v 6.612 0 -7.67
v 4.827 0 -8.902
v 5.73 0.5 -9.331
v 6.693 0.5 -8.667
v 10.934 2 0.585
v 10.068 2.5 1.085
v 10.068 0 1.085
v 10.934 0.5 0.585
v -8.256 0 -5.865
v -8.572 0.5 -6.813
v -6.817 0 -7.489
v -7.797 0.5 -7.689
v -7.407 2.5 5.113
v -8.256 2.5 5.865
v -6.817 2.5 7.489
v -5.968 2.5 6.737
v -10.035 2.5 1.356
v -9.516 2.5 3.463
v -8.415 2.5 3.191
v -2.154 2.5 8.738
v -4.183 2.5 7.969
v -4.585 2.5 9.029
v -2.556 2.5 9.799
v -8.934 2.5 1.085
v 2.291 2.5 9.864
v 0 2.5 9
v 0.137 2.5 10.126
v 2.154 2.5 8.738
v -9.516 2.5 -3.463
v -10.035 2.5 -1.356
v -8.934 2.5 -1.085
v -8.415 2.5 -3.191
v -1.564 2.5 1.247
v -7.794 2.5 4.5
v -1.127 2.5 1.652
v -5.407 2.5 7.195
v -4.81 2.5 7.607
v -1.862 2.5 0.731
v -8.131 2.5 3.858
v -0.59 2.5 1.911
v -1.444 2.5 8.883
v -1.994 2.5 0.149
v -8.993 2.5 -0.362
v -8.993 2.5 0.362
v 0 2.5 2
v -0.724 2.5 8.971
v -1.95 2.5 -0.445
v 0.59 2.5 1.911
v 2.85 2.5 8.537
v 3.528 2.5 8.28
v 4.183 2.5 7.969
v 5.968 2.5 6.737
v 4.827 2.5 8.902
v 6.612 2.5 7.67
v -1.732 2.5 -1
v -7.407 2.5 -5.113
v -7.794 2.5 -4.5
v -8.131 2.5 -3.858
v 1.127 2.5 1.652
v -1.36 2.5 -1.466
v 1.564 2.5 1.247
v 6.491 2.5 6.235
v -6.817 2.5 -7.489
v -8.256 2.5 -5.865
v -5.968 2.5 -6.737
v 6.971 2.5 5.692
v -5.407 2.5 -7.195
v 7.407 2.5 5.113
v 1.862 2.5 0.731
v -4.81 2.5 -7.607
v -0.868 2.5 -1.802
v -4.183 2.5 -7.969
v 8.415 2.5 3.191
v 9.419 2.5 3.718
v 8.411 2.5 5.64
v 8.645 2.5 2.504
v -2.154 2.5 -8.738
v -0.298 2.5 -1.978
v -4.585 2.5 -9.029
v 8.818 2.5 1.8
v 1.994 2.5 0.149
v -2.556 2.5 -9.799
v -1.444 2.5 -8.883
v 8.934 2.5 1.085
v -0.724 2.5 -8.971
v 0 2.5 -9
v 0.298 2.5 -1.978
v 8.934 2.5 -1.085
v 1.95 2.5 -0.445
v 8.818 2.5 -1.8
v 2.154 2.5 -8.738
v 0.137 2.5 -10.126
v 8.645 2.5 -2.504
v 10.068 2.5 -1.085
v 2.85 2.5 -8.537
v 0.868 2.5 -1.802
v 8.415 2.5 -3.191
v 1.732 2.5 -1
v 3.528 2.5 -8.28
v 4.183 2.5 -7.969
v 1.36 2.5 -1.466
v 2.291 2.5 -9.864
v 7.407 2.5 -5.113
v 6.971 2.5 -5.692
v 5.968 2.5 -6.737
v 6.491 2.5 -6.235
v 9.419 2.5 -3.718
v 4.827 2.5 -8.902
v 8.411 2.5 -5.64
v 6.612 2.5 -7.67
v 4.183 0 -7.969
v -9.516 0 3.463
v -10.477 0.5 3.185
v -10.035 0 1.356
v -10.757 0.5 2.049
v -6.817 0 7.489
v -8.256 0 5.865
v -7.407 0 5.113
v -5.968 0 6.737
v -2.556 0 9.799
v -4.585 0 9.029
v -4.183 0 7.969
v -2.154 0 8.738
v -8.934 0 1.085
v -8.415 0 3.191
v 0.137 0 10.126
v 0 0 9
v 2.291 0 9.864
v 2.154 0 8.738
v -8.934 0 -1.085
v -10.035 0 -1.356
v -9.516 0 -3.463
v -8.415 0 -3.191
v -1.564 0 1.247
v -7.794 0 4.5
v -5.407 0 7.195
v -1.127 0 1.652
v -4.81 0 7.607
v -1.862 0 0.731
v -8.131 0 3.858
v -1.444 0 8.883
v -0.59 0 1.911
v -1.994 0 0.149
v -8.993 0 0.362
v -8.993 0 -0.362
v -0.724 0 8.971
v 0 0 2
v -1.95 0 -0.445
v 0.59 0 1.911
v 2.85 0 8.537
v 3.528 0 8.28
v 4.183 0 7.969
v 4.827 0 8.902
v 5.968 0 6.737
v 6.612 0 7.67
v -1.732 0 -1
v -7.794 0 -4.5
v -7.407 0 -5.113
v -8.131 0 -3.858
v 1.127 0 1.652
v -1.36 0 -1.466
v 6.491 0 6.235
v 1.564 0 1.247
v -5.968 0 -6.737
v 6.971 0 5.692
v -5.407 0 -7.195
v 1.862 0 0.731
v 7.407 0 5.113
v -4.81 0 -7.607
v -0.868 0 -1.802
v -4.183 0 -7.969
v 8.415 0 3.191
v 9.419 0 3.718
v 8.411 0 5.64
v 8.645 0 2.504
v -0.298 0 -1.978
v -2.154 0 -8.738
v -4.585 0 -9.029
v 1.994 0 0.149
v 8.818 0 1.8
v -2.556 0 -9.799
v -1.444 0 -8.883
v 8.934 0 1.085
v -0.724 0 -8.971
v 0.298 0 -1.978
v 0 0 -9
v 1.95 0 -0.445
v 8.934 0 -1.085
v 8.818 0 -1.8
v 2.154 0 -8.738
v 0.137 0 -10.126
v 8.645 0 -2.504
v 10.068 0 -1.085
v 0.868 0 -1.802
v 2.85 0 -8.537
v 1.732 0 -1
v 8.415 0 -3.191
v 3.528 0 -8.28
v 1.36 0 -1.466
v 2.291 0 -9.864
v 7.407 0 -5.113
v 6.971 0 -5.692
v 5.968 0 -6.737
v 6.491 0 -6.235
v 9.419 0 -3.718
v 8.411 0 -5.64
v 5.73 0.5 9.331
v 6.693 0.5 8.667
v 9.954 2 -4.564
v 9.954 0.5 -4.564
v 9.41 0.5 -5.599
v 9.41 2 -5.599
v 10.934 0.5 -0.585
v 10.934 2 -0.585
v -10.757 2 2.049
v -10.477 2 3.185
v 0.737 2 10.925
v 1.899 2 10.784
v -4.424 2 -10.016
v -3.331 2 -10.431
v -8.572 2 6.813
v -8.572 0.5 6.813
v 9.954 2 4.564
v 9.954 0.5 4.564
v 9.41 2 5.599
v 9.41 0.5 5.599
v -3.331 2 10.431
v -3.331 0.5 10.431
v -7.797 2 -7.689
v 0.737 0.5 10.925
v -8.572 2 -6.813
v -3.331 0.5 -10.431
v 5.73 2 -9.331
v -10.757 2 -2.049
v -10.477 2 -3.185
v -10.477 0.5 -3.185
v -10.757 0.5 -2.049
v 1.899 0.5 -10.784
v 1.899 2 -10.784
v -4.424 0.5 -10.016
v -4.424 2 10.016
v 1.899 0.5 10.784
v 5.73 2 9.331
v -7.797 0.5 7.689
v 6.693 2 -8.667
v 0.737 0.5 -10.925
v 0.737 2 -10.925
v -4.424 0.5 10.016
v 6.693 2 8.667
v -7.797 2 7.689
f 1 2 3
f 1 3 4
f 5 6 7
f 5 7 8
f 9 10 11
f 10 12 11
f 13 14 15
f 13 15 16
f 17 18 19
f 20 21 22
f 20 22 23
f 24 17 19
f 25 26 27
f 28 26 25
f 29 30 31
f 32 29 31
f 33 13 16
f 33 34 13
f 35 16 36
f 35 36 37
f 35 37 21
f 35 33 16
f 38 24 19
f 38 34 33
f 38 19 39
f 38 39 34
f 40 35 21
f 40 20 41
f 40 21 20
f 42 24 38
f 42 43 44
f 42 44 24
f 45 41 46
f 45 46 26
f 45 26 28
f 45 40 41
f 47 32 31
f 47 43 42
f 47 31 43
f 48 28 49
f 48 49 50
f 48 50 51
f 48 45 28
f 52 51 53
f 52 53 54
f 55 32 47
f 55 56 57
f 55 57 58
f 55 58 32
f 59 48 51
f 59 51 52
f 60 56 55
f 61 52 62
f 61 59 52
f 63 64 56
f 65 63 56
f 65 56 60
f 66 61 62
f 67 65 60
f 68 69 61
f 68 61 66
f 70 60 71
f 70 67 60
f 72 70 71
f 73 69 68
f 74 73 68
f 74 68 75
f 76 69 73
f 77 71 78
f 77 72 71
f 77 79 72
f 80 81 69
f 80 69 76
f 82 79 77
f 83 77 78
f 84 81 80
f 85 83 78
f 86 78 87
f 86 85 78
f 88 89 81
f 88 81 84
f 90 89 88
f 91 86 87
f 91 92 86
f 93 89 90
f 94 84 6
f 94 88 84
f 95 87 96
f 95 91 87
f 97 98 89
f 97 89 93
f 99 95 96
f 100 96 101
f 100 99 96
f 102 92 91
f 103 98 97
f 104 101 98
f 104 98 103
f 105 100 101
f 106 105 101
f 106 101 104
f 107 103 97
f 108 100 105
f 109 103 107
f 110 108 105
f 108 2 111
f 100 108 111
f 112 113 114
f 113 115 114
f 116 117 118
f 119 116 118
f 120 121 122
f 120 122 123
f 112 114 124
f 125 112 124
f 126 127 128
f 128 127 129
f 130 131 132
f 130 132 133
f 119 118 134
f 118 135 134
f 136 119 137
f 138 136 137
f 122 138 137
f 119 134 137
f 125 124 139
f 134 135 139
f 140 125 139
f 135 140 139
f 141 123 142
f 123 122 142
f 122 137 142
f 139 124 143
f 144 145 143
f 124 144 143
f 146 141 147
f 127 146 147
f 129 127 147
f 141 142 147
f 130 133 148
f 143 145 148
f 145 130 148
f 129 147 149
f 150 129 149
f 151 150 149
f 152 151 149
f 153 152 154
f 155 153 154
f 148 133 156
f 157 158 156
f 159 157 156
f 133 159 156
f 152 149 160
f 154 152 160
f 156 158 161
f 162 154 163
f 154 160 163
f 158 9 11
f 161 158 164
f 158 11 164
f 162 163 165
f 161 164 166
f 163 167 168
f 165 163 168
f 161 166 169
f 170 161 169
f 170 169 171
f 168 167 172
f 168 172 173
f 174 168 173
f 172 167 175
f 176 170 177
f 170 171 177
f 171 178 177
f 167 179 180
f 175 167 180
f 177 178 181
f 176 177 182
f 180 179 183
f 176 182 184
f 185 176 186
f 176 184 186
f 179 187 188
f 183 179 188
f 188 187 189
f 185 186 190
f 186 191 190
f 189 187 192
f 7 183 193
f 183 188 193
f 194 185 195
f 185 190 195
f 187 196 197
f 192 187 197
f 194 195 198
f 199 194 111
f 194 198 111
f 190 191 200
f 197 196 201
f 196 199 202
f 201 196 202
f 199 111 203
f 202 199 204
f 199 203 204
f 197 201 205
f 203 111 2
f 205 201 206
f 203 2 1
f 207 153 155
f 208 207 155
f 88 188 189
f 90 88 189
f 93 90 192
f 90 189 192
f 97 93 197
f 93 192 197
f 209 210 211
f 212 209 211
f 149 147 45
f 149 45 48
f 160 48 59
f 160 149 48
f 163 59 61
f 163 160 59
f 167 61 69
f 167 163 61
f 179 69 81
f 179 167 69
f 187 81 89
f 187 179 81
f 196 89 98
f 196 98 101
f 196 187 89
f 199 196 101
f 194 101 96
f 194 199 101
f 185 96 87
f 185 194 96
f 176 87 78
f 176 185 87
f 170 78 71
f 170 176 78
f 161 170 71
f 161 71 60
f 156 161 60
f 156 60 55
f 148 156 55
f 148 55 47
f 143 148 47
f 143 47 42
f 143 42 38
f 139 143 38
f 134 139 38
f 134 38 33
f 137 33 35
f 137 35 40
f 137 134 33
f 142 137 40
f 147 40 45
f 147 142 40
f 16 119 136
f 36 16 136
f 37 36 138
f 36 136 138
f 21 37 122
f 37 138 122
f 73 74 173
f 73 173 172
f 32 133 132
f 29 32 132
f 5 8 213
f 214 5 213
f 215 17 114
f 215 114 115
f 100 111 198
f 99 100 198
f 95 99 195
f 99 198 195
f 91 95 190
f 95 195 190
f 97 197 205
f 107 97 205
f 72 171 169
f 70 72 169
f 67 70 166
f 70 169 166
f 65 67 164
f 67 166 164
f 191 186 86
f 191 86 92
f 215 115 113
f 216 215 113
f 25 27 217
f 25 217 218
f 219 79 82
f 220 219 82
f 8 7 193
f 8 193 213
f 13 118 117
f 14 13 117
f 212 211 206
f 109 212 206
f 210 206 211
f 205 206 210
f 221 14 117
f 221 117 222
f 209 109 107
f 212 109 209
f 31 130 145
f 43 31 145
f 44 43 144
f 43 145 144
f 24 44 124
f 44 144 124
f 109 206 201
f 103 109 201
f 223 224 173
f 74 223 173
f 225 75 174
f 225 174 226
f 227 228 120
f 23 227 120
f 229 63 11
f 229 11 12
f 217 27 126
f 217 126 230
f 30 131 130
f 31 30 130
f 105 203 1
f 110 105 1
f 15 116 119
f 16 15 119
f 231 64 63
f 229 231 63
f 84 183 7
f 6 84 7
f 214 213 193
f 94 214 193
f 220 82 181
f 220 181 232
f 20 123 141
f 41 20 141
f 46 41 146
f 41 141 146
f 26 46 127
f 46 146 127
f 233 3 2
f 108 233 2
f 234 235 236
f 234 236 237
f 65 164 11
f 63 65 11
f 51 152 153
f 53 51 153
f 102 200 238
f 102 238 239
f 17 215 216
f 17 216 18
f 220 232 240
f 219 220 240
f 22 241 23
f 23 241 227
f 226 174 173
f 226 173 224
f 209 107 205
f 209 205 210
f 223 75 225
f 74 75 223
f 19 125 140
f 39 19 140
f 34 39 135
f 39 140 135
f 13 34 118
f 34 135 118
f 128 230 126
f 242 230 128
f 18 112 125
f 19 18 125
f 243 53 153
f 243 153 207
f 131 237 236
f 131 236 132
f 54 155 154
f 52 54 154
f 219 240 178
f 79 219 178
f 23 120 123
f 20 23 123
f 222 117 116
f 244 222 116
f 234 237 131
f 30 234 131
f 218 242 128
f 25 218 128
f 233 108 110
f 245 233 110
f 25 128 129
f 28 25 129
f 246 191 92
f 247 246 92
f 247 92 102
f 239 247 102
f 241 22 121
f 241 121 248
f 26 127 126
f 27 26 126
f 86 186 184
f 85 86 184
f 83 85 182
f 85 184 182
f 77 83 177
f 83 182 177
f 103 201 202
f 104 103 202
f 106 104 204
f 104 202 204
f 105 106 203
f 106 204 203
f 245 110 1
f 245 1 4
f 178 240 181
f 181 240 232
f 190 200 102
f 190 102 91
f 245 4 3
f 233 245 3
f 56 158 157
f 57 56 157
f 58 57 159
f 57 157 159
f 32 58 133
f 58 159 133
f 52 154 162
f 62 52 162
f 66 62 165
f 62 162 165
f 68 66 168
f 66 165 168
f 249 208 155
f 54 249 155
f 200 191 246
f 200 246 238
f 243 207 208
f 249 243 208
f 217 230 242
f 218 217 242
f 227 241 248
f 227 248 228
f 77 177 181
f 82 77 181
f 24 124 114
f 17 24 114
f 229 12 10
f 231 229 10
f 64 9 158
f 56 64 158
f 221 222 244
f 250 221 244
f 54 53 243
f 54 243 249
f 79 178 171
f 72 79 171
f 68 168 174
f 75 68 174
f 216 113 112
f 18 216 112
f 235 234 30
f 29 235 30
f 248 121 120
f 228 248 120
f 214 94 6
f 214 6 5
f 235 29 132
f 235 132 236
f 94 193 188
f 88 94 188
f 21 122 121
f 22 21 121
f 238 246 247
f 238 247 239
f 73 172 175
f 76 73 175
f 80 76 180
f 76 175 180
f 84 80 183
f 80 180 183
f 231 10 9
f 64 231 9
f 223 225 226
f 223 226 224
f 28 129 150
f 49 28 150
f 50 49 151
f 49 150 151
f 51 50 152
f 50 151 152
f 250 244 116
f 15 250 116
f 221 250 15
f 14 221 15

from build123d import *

# Parameters (mm, degrees)
SKETCH1_R                = 9
SKETCH1_R_2              = 2
BOSS_EXTRUDE1_DEPTH      = 2.5
BOSS_EXTRUDE2_START      = -2.5
BOSS_EXTRUDE2_DEPTH      = 2.5
CHAMFER1_SIZE            = 0.5
CHAMFER1_SIZE2           = 0.866025404
CIRPATTERN1_DEPTH        = 2.5
CIRPATTERN1_START        = -6
CIRPATTERN1_2_OUTLINE_W  = 5
CIRPATTERN1_2_OUTLINE_H  = 6
CIRPATTERN1_2_DEPTH      = 0.965822768
CIRPATTERN1_START_2      = -7.632253443
CIRPATTERN1_3_OUTLINE_W  = 5
CIRPATTERN1_3_OUTLINE_H  = 6
CIRPATTERN1_3_DEPTH      = 0.433012702
CIRPATTERN1_4_OUTLINE_W  = 5
CIRPATTERN1_4_OUTLINE_H  = 5
CIRPATTERN1_4_DEPTH      = 0.965822768
CIRPATTERN1_START_3      = -9
CIRPATTERN1_5_OUTLINE_W  = 5
CIRPATTERN1_5_OUTLINE_H  = 6
CIRPATTERN1_5_DEPTH      = 1.800759259
CIRPATTERN1_START_4      = -5.467189934
CIRPATTERN1_6_OUTLINE_W  = 5
CIRPATTERN1_6_OUTLINE_H  = 5
CIRPATTERN1_6_DEPTH      = 0.433012702
CIRPATTERN1_7_OUTLINE_W  = 6
CIRPATTERN1_7_OUTLINE_H  = 5
CIRPATTERN1_7_DEPTH      = 1.800759259
CIRPATTERN1_8_OUTLINE_W  = 5
CIRPATTERN1_8_OUTLINE_H  = 5
CIRPATTERN1_8_DEPTH      = 0.965822768
CIRPATTERN1_9_OUTLINE_W  = 6
CIRPATTERN1_9_OUTLINE_H  = 5
CIRPATTERN1_9_DEPTH      = 1.800759259
CIRPATTERN1_10_OUTLINE_W = 5
CIRPATTERN1_10_OUTLINE_H = 5
CIRPATTERN1_10_DEPTH     = 0.965822768
CIRPATTERN1_11_OUTLINE_W = 5
CIRPATTERN1_11_OUTLINE_H = 6
CIRPATTERN1_11_DEPTH     = 1.800759259
CIRPATTERN1_12_OUTLINE_W = 5
CIRPATTERN1_12_OUTLINE_H = 6
CIRPATTERN1_12_DEPTH     = 0.965822768
CIRPATTERN1_13_OUTLINE_W = 5
CIRPATTERN1_13_OUTLINE_H = 6
CIRPATTERN1_13_DEPTH     = 1.800759259
CIRPATTERN1_START_5      = 5.034177232
CIRPATTERN1_14_OUTLINE_W = 5
CIRPATTERN1_14_OUTLINE_H = 5
CIRPATTERN1_14_DEPTH     = 0.965822768
CIRPATTERN1_START_6      = 7.199240741
CIRPATTERN1_15_OUTLINE_W = 5
CIRPATTERN1_15_OUTLINE_H = 5
CIRPATTERN1_15_DEPTH     = 0.433012702
CIRPATTERN1_16_OUTLINE_W = 5
CIRPATTERN1_16_OUTLINE_H = 6
CIRPATTERN1_16_DEPTH     = 0.965822768
CIRPATTERN1_17_OUTLINE_W = 6
CIRPATTERN1_17_OUTLINE_H = 6
CIRPATTERN1_17_DEPTH     = 1.800759259
CIRPATTERN1_18_OUTLINE_W = 6
CIRPATTERN1_18_OUTLINE_H = 6
CIRPATTERN1_18_DEPTH     = 0.965822768
CIRPATTERN1_19_OUTLINE_W = 6
CIRPATTERN1_19_OUTLINE_H = 6
CIRPATTERN1_19_DEPTH     = 1.800759259
CIRPATTERN1_20_OUTLINE_W = 5
CIRPATTERN1_20_OUTLINE_H = 6
CIRPATTERN1_20_DEPTH     = 0.965822768
CIRPATTERN1_21_OUTLINE_W = 5
CIRPATTERN1_21_OUTLINE_H = 6
CIRPATTERN1_21_DEPTH     = 0.433012702
CIRPATTERN1_22_OUTLINE_W = 6
CIRPATTERN1_22_OUTLINE_H = 6
CIRPATTERN1_22_DEPTH     = 0.965822768
CIRPATTERN1_23_OUTLINE_W = 6
CIRPATTERN1_23_OUTLINE_H = 6
CIRPATTERN1_23_DEPTH     = 1.800759259
CIRPATTERN1_24_OUTLINE_W = 5
CIRPATTERN1_24_OUTLINE_H = 6
CIRPATTERN1_24_DEPTH     = 0.965822768
CIRPATTERN1_25_OUTLINE_W = 6
CIRPATTERN1_25_OUTLINE_H = 6
CIRPATTERN1_25_DEPTH     = 1.800759259


with BuildPart() as part:
    # Sketch1 → Boss-Extrude1 (new body)
    with BuildSketch(Plane(origin=(0, 0, 0), x_dir=(1, 0, 0), z_dir=(0, 1, 0))):
        with Locations(Location((0, 0, 0), (0, 0, 270))):
            Circle(SKETCH1_R)
        with Locations(Location((0, 0, 0), (0, 0, 270))):
            Circle(SKETCH1_R_2, mode=Mode.SUBTRACT)
    extrude(amount=BOSS_EXTRUDE1_DEPTH)

    # Sketch2 → Boss-Extrude2 (add)
    with BuildSketch(Plane(origin=(0, 2.5, 0), x_dir=(1, 0, 0), z_dir=(0, 1, 0)).offset(BOSS_EXTRUDE2_START)):
        with BuildLine():
            Line((0, 9), (0.241073361, 10.985417748))
            Line((0.241073361, 10.985417748), (2.394914339, 10.723894105))
            Line((2.394914339, 10.723894105), (2.153840979, 8.738476357))
            ThreePointArc((2.153840979, 8.738476357), (1.084830122, 8.934379867), (0, 9))
        make_face()
    extrude(amount=BOSS_EXTRUDE2_DEPTH)

    # Chamfer1
    chamfer1_edges = [part.edges().sort_by_distance(p)[0] for p in [
        (0.241073361, 1.25, -10.985417748),
        (2.394914339, 1.25, -10.723894105),
        (1.31799385, 2.5, -10.854655927),
        (1.31799385, 0, -10.854655927),
    ]]
    chamfer1_side = [part.faces().sort_by_distance(p)[0] for p in [
        (1.31799385, 1.25, -10.854655927),
    ]]
    chamfer(chamfer1_edges, length=CHAMFER1_SIZE, length2=CHAMFER1_SIZE2, reference=chamfer1_side[0])

    # CirPattern1: read off the stored shape, not the designer's step
    # CirPattern1 outline → CirPattern1 (add)
    with BuildSketch(Plane(origin=(0, 0, 0), x_dir=(1, 0, 0), z_dir=(0, 1, 0))):
        with BuildLine():
            Line((-4.424210201, 10.01643916), (-4.584621482, 9.029388897))
            Line((-4.584621482, 9.029388897), (-4.182508548, 7.969104231))
            ThreePointArc((-4.182508548, 7.969104231), (-3.191443983, 8.415146184), (-2.153840979, 8.738476357))
            Line((-2.153840979, 8.738476357), (-2.555953912, 9.798761023))
            Line((-2.555953912, 9.798761023), (-3.330558874, 10.431206399))
            Line((-3.330558874, 10.431206399), (-4.424210201, 10.01643916))
        make_face()
        with BuildLine():
            ThreePointArc((4.182508548, 7.969104232), (5.112582721, 7.406854794), (5.968103924, 6.736596734))
            Line((5.968103924, 6.736596734), (6.612274916, 7.669839531))
            Line((6.612274916, 7.669839531), (6.692741485, 8.666596839))
            Line((6.692741485, 8.666596839), (5.730129975, 9.331039589))
            Line((5.730129975, 9.331039589), (4.82667954, 8.902347028))
            Line((4.82667954, 8.902347028), (4.182508548, 7.969104232))
        make_face()
        with BuildLine():
            ThreePointArc((7.406854794, 5.112582721), (7.969104232, 4.182508549), (8.415146185, 3.191443983))
            Line((8.415146185, 3.191443983), (9.419230823, 3.718428255))
            Line((9.419230823, 3.718428255), (9.953696649, 4.56361834))
            Line((9.953696649, 4.56361834), (9.41012843, 5.599301052))
            Line((9.41012843, 5.599301052), (8.410939432, 5.639566992))
            Line((8.410939432, 5.639566992), (7.406854794, 5.112582721))
        make_face()
        with BuildLine():
            ThreePointArc((8.934379868, 1.084830122), (9.000000001, 0), (8.934379868, -1.084830122))
            Line((8.934379868, -1.084830122), (10.068354463, -1.084830122))
            Line((10.068354463, -1.084830122), (10.934379867, -0.584830122))
            Line((10.934379867, -0.584830122), (10.934379867, 0.584830122))
            Line((10.934379867, 0.584830122), (10.068354463, 1.084830122))
            Line((10.068354463, 1.084830122), (8.934379868, 1.084830122))
        make_face()
        with BuildLine():
            ThreePointArc((8.415146185, -3.191443984), (7.969104232, -4.182508549), (7.406854794, -5.112582721))
            Line((7.406854794, -5.112582721), (8.410939432, -5.639566992))
            Line((8.410939432, -5.639566992), (9.41012843, -5.599301052))
            Line((9.41012843, -5.599301052), (9.953696649, -4.56361834))
            Line((9.953696649, -4.56361834), (9.419230823, -3.718428255))
            Line((9.419230823, -3.718428255), (8.415146185, -3.191443984))
        make_face()
        with BuildLine():
            ThreePointArc((5.968103924, -6.736596734), (5.112582721, -7.406854794), (4.182508548, -7.969104232))
            Line((4.182508548, -7.969104232), (4.82667954, -8.902347028))
            Line((4.82667954, -8.902347028), (5.730129975, -9.331039589))
            Line((5.730129975, -9.331039589), (6.692741485, -8.666596839))
            Line((6.692741485, -8.666596839), (6.612274916, -7.669839531))
            Line((6.612274916, -7.669839531), (5.968103924, -6.736596734))
        make_face()
        with BuildLine():
            ThreePointArc((2.153840979, -8.738476357), (1.084830123, -8.934379867), (0, -9))
            Line((0, -9), (0.136685533, -10.125706645))
            Line((0.136685533, -10.125706645), (0.737427798, -10.925149408))
            Line((0.737427798, -10.925149408), (1.898559902, -10.784162445))
            Line((1.898559902, -10.784162445), (2.290526512, -9.864183001))
            Line((2.290526512, -9.864183001), (2.153840979, -8.738476357))
        make_face()
        with BuildLine():
            ThreePointArc((-2.153840979, -8.738476357), (-3.191443983, -8.415146184), (-4.182508548, -7.969104231))
            Line((-4.182508548, -7.969104231), (-4.584621482, -9.029388897))
            Line((-4.584621482, -9.029388897), (-4.424210201, -10.01643916))
            Line((-4.424210201, -10.01643916), (-3.330558874, -10.431206399))
            Line((-3.330558874, -10.431206399), (-2.555953912, -9.798761023))
            Line((-2.555953912, -9.798761023), (-2.153840979, -8.738476357))
        make_face()
        with BuildLine():
            ThreePointArc((-5.968103923, -6.736596733), (-6.736596733, -5.968103924), (-7.406854792, -5.11258272))
            Line((-7.406854792, -5.11258272), (-8.255646966, -5.864546969))
            Line((-8.255646966, -5.864546969), (-8.57231496, -6.813083411))
            Line((-8.57231496, -6.813083411), (-7.79668675, -7.688586676))
            Line((-7.79668675, -7.688586676), (-6.816896098, -7.488560982))
            Line((-6.816896098, -7.488560982), (-5.968103923, -6.736596733))
        make_face()
        with BuildLine():
            ThreePointArc((-8.415146183, -3.191443983), (-8.738476356, -2.153840978), (-8.934379866, -1.084830122))
            Line((-8.934379866, -1.084830122), (-10.035403222, -1.356208006))
            Line((-10.035403222, -1.356208006), (-10.75660567, -2.04893236))
            Line((-10.75660567, -2.04893236), (-10.476687651, -3.184604403))
            Line((-10.476687651, -3.184604403), (-9.51616954, -3.462821867))
            Line((-9.51616954, -3.462821867), (-8.415146183, -3.191443983))
        make_face()
        with BuildLine():
            ThreePointArc((-8.934379866, 1.084830122), (-8.738476356, 2.153840978), (-8.415146183, 3.191443983))
            Line((-8.415146183, 3.191443983), (-9.51616954, 3.462821867))
            Line((-9.51616954, 3.462821867), (-10.476687651, 3.184604403))
            Line((-10.476687651, 3.184604403), (-10.75660567, 2.04893236))
            Line((-10.75660567, 2.04893236), (-10.035403222, 1.356208006))
            Line((-10.035403222, 1.356208006), (-8.934379866, 1.084830122))
        make_face()
        with BuildLine():
            ThreePointArc((-7.406854792, 5.11258272), (-6.736596733, 5.968103924), (-5.968103923, 6.736596733))
            Line((-5.968103923, 6.736596733), (-6.816896098, 7.488560982))
            Line((-6.816896098, 7.488560982), (-7.79668675, 7.688586676))
            Line((-7.79668675, 7.688586676), (-8.57231496, 6.813083411))
            Line((-8.57231496, 6.813083411), (-8.255646966, 5.864546969))
            Line((-8.255646966, 5.864546969), (-7.406854792, 5.11258272))
        make_face()
    extrude(amount=CIRPATTERN1_DEPTH)

    # CirPattern1 2 outline → CirPattern1 2 (cut)
    with BuildSketch(Plane(origin=(0, 0, 0), x_dir=(0.984156412122274, -0.15602034224555472, -0.08422475458078069), z_dir=(0.17730244352126895, 0.8660254037844377, 0.4675081213427088)).offset(CIRPATTERN1_START)):
        with Locations((-2.5, 9)):
            Rectangle(CIRPATTERN1_2_OUTLINE_W, CIRPATTERN1_2_OUTLINE_H)
    extrude(amount=CIRPATTERN1_2_DEPTH, mode=Mode.SUBTRACT)

    # CirPattern1 3 outline → CirPattern1 3 (cut)
    with BuildSketch(Plane(origin=(0, 0, 0), x_dir=(0.984156412122274, 0.15602034224555472, -0.08422475458078069), z_dir=(0.17730244352126895, -0.8660254037844377, 0.4675081213427088)).offset(CIRPATTERN1_START_2)):
        with Locations((-2.5, -8)):
            Rectangle(CIRPATTERN1_3_OUTLINE_W, CIRPATTERN1_3_OUTLINE_H)
    extrude(amount=CIRPATTERN1_3_DEPTH, mode=Mode.SUBTRACT)

    # CirPattern1 4 outline → CirPattern1 4 (cut)
    with BuildSketch(Plane(origin=(0, 0, 0), x_dir=(0.9273256790190187, -0.3495154602035865, -0.13381340781323425), z_dir=(0.37425537408555104, 0.8660254037844392, 0.33156132912039604)).offset(CIRPATTERN1_START)):
        with Locations((-6.5, 6.5)):
            Rectangle(CIRPATTERN1_4_OUTLINE_W, CIRPATTERN1_4_OUTLINE_H)
    extrude(amount=CIRPATTERN1_4_DEPTH, mode=Mode.SUBTRACT)

    # CirPattern1 5 outline → CirPattern1 5 (cut)
    with BuildSketch(Plane(origin=(0, 0, 0), x_dir=(0.9273256790190192, 0.3495154602035857, -0.13381340781323395), z_dir=(0.3742553740855502, -0.8660254037844394, 0.33156132912039615)).offset(CIRPATTERN1_START_3)):
        with Locations((-5.5, -6)):
            Rectangle(CIRPATTERN1_5_OUTLINE_W, CIRPATTERN1_5_OUTLINE_H)
    extrude(amount=CIRPATTERN1_5_DEPTH, mode=Mode.SUBTRACT)

    # CirPattern1 6 outline → CirPattern1 6 (cut)
    with BuildSketch(Plane(origin=(0, 0, 0), x_dir=(0.8742528220105147, -0.48090223921375025, -0.06644576379162259), z_dir=(0.48547090871302595, 0.866025403784439, 0.11965783214377698)).offset(CIRPATTERN1_START_4)):
        with Locations((-9.5, 2.5)):
            Rectangle(CIRPATTERN1_6_OUTLINE_W, CIRPATTERN1_6_OUTLINE_H)
    extrude(amount=CIRPATTERN1_6_DEPTH, mode=Mode.SUBTRACT)

    # CirPattern1 7 outline → CirPattern1 7 (cut)
    with BuildSketch(Plane(origin=(0, 0, 0), x_dir=(0.8742528220105142, 0.4809022392137511, -0.06644576379162273), z_dir=(0.48547090871302684, -0.8660254037844385, 0.11965783214377695)).offset(CIRPATTERN1_START_3)):
        with Locations((-8, -2.5)):
            Rectangle(CIRPATTERN1_7_OUTLINE_W, CIRPATTERN1_7_OUTLINE_H)
    extrude(amount=CIRPATTERN1_7_DEPTH, mode=Mode.SUBTRACT)

    # CirPattern1 8 outline → CirPattern1 8 (cut)
    with BuildSketch(Plane(origin=(0, 0, 0), x_dir=(0.8742528220105146, -0.48090223921375014, 0.06644576379162488), z_dir=(0.4854709087130262, 0.8660254037844384, -0.11965783214378103)).offset(CIRPATTERN1_START)):
        with Locations((-9.5, -2.5)):
            Rectangle(CIRPATTERN1_8_OUTLINE_W, CIRPATTERN1_8_OUTLINE_H)
    extrude(amount=CIRPATTERN1_8_DEPTH, mode=Mode.SUBTRACT)

    # CirPattern1 9 outline → CirPattern1 9 (cut)
    with BuildSketch(Plane(origin=(0, 0, 0), x_dir=(0.8742528220105146, 0.48090223921375014, 0.06644576379162488), z_dir=(0.4854709087130262, -0.8660254037844384, -0.11965783214378103)).offset(CIRPATTERN1_START_3)):
        with Locations((-8, 2.5)):
            Rectangle(CIRPATTERN1_9_OUTLINE_W, CIRPATTERN1_9_OUTLINE_H)
    extrude(amount=CIRPATTERN1_9_DEPTH, mode=Mode.SUBTRACT)

    # CirPattern1 10 outline → CirPattern1 10 (cut)
    with BuildSketch(Plane(origin=(0, 0, 0), x_dir=(0.9273256790190201, -0.34951546020358326, 0.13381340781323425), z_dir=(0.37425537408554804, 0.8660254037844393, -0.3315613291203991)).offset(CIRPATTERN1_START)):
        with Locations((-6.5, -6.5)):
            Rectangle(CIRPATTERN1_10_OUTLINE_W, CIRPATTERN1_10_OUTLINE_H)
    extrude(amount=CIRPATTERN1_10_DEPTH, mode=Mode.SUBTRACT)

    # CirPattern1 11 outline → CirPattern1 11 (cut)
    with BuildSketch(Plane(origin=(0, 0, 0), x_dir=(0.9273256790190201, 0.34951546020358326, 0.13381340781323425), z_dir=(0.37425537408554804, -0.8660254037844393, -0.3315613291203991)).offset(CIRPATTERN1_START_3)):
        with Locations((-5.5, 6)):
            Rectangle(CIRPATTERN1_11_OUTLINE_W, CIRPATTERN1_11_OUTLINE_H)
    extrude(amount=CIRPATTERN1_11_DEPTH, mode=Mode.SUBTRACT)

    # CirPattern1 12 outline → CirPattern1 12 (cut)
    with BuildSketch(Plane(origin=(0, 0, 0), x_dir=(0.9841564121222747, -0.15602034224555122, 0.08422475458077869), z_dir=(0.17730244352126492, 0.8660254037844386, -0.4675081213427087)).offset(CIRPATTERN1_START)):
        with Locations((-2.5, -9)):
            Rectangle(CIRPATTERN1_12_OUTLINE_W, CIRPATTERN1_12_OUTLINE_H)
    extrude(amount=CIRPATTERN1_12_DEPTH, mode=Mode.SUBTRACT)

    # CirPattern1 13 outline → CirPattern1 13 (cut)
    with BuildSketch(Plane(origin=(0, 0, 0), x_dir=(0.9841564121222747, 0.15602034224555134, 0.08422475458077885), z_dir=(0.1773024435212651, -0.8660254037844384, -0.4675081213427092)).offset(CIRPATTERN1_START_3)):
        with Locations((-2.5, 8)):
            Rectangle(CIRPATTERN1_13_OUTLINE_W, CIRPATTERN1_13_OUTLINE_H)
    extrude(amount=CIRPATTERN1_13_DEPTH, mode=Mode.SUBTRACT)

    # CirPattern1 14 outline → CirPattern1 14 (cut)
    with BuildSketch(Plane(origin=(0, 0, 0), x_dir=(0.9981822114114517, 0.05228896387632066, -0.029968935224408574), z_dir=(0.0602683401276654, -0.8660254037844379, 0.49635443704902793)).offset(CIRPATTERN1_START_5)):
        with Locations((0.5, 9.5)):
            Rectangle(CIRPATTERN1_14_OUTLINE_W, CIRPATTERN1_14_OUTLINE_H)
    extrude(amount=CIRPATTERN1_14_DEPTH, mode=Mode.SUBTRACT)

    # CirPattern1 15 outline → CirPattern1 15 (cut)
    with BuildSketch(Plane(origin=(0, 0, 0), x_dir=(0.9981822114114517, -0.05228896387632066, -0.029968935224408574), z_dir=(0.0602683401276654, 0.8660254037844379, 0.49635443704902793)).offset(CIRPATTERN1_START_6)):
        with Locations((0.5, -8.5)):
            Rectangle(CIRPATTERN1_15_OUTLINE_W, CIRPATTERN1_15_OUTLINE_H)
    extrude(amount=CIRPATTERN1_15_DEPTH, mode=Mode.SUBTRACT)

    # CirPattern1 16 outline → CirPattern1 16 (cut)
    with BuildSketch(Plane(origin=(0, 0, 0), x_dir=(0.9588146905843248, 0.2565451418791621, -0.1218974130073563), z_dir=(0.28403237336558207, -0.8660254037844384, 0.4114919329468262)).offset(CIRPATTERN1_START_5)):
        with Locations((4.5, 8)):
            Rectangle(CIRPATTERN1_16_OUTLINE_W, CIRPATTERN1_16_OUTLINE_H)
    extrude(amount=CIRPATTERN1_16_DEPTH, mode=Mode.SUBTRACT)

    # CirPattern1 17 outline → CirPattern1 17 (cut)
    with BuildSketch(Plane(origin=(0, 0, 0), x_dir=(0.9588146905843248, -0.256545141879162, -0.12189741300735611), z_dir=(0.2840323733655819, 0.8660254037844386, 0.41149193294682584)).offset(CIRPATTERN1_START_6)):
        with Locations((4, -7)):
            Rectangle(CIRPATTERN1_17_OUTLINE_W, CIRPATTERN1_17_OUTLINE_H)
    extrude(amount=CIRPATTERN1_17_DEPTH, mode=Mode.SUBTRACT)

    # CirPattern1 18 outline → CirPattern1 18 (cut)
    with BuildSketch(Plane(origin=(0, 0, 0), x_dir=(0.8966559578002048, 0.4276040355717775, -0.1147296043056335), z_dir=(0.442728012826608, -0.866025403784438, 0.23236158602188103)).offset(CIRPATTERN1_START_5)):
        with Locations((8, 5)):
            Rectangle(CIRPATTERN1_18_OUTLINE_W, CIRPATTERN1_18_OUTLINE_H)
    extrude(amount=CIRPATTERN1_18_DEPTH, mode=Mode.SUBTRACT)

    # CirPattern1 19 outline → CirPattern1 19 (cut)
    with BuildSketch(Plane(origin=(0, 0, 0), x_dir=(0.8966559578002048, -0.42760403557177773, -0.11472960430563307), z_dir=(0.4427280128266081, 0.8660254037844383, 0.2323615860218801)).offset(CIRPATTERN1_START_6)):
        with Locations((7, -4)):
            Rectangle(CIRPATTERN1_19_OUTLINE_W, CIRPATTERN1_19_OUTLINE_H)
    extrude(amount=CIRPATTERN1_19_DEPTH, mode=Mode.SUBTRACT)

    # CirPattern1 20 outline → CirPattern1 20 (cut)
    with BuildSketch(Plane(origin=(0, 0, 0), x_dir=(0.8660254037844386, 0.4999999999999999, 0), z_dir=(0.4999999999999999, -0.8660254037844388, 0)).offset(CIRPATTERN1_START_5)):
        with Locations((9.5, 0)):
            Rectangle(CIRPATTERN1_20_OUTLINE_W, CIRPATTERN1_20_OUTLINE_H)
    extrude(amount=CIRPATTERN1_20_DEPTH, mode=Mode.SUBTRACT)

    # CirPattern1 21 outline → CirPattern1 21 (cut)
    with BuildSketch(Plane(origin=(0, 0, 0), x_dir=(0.8660254037844386, -0.4999999999999999, 0), z_dir=(0.4999999999999999, 0.8660254037844388, 0)).offset(CIRPATTERN1_START_6)):
        with Locations((8.5, 0)):
            Rectangle(CIRPATTERN1_21_OUTLINE_W, CIRPATTERN1_21_OUTLINE_H)
    extrude(amount=CIRPATTERN1_21_DEPTH, mode=Mode.SUBTRACT)

    # CirPattern1 22 outline → CirPattern1 22 (cut)
    with BuildSketch(Plane(origin=(0, 0, 0), x_dir=(0.8966559578002079, 0.4276040355717707, 0.11472960430563549), z_dir=(0.44272801282660196, -0.8660254037844389, -0.232361586021889)).offset(CIRPATTERN1_START_5)):
        with Locations((8, -5)):
            Rectangle(CIRPATTERN1_22_OUTLINE_W, CIRPATTERN1_22_OUTLINE_H)
    extrude(amount=CIRPATTERN1_22_DEPTH, mode=Mode.SUBTRACT)

    # CirPattern1 23 outline → CirPattern1 23 (cut)
    with BuildSketch(Plane(origin=(0, 0, 0), x_dir=(0.8966559578002083, -0.42760403557177, 0.1147296043056353), z_dir=(0.4427280128266012, 0.8660254037844394, -0.23236158602188908)).offset(CIRPATTERN1_START_6)):
        with Locations((7, 4)):
            Rectangle(CIRPATTERN1_23_OUTLINE_W, CIRPATTERN1_23_OUTLINE_H)
    extrude(amount=CIRPATTERN1_23_DEPTH, mode=Mode.SUBTRACT)

    # CirPattern1 24 outline → CirPattern1 24 (cut)
    with BuildSketch(Plane(origin=(0, 0, 0), x_dir=(0.9588146905843272, 0.25654514187915395, 0.12189741300735493), z_dir=(0.2840323733655741, -0.8660254037844373, -0.4114919329468341)).offset(CIRPATTERN1_START_5)):
        with Locations((4.5, -8)):
            Rectangle(CIRPATTERN1_24_OUTLINE_W, CIRPATTERN1_24_OUTLINE_H)
    extrude(amount=CIRPATTERN1_24_DEPTH, mode=Mode.SUBTRACT)

    # CirPattern1 25 outline → CirPattern1 25 (cut)
    with BuildSketch(Plane(origin=(0, 0, 0), x_dir=(0.9588146905843271, -0.2565451418791541, 0.12189741300735471), z_dir=(0.2840323733655742, 0.8660254037844375, -0.4114919329468332)).offset(CIRPATTERN1_START_6)):
        with Locations((4, 7)):
            Rectangle(CIRPATTERN1_25_OUTLINE_W, CIRPATTERN1_25_OUTLINE_H)
    extrude(amount=CIRPATTERN1_25_DEPTH, mode=Mode.SUBTRACT)


solid = part.part
